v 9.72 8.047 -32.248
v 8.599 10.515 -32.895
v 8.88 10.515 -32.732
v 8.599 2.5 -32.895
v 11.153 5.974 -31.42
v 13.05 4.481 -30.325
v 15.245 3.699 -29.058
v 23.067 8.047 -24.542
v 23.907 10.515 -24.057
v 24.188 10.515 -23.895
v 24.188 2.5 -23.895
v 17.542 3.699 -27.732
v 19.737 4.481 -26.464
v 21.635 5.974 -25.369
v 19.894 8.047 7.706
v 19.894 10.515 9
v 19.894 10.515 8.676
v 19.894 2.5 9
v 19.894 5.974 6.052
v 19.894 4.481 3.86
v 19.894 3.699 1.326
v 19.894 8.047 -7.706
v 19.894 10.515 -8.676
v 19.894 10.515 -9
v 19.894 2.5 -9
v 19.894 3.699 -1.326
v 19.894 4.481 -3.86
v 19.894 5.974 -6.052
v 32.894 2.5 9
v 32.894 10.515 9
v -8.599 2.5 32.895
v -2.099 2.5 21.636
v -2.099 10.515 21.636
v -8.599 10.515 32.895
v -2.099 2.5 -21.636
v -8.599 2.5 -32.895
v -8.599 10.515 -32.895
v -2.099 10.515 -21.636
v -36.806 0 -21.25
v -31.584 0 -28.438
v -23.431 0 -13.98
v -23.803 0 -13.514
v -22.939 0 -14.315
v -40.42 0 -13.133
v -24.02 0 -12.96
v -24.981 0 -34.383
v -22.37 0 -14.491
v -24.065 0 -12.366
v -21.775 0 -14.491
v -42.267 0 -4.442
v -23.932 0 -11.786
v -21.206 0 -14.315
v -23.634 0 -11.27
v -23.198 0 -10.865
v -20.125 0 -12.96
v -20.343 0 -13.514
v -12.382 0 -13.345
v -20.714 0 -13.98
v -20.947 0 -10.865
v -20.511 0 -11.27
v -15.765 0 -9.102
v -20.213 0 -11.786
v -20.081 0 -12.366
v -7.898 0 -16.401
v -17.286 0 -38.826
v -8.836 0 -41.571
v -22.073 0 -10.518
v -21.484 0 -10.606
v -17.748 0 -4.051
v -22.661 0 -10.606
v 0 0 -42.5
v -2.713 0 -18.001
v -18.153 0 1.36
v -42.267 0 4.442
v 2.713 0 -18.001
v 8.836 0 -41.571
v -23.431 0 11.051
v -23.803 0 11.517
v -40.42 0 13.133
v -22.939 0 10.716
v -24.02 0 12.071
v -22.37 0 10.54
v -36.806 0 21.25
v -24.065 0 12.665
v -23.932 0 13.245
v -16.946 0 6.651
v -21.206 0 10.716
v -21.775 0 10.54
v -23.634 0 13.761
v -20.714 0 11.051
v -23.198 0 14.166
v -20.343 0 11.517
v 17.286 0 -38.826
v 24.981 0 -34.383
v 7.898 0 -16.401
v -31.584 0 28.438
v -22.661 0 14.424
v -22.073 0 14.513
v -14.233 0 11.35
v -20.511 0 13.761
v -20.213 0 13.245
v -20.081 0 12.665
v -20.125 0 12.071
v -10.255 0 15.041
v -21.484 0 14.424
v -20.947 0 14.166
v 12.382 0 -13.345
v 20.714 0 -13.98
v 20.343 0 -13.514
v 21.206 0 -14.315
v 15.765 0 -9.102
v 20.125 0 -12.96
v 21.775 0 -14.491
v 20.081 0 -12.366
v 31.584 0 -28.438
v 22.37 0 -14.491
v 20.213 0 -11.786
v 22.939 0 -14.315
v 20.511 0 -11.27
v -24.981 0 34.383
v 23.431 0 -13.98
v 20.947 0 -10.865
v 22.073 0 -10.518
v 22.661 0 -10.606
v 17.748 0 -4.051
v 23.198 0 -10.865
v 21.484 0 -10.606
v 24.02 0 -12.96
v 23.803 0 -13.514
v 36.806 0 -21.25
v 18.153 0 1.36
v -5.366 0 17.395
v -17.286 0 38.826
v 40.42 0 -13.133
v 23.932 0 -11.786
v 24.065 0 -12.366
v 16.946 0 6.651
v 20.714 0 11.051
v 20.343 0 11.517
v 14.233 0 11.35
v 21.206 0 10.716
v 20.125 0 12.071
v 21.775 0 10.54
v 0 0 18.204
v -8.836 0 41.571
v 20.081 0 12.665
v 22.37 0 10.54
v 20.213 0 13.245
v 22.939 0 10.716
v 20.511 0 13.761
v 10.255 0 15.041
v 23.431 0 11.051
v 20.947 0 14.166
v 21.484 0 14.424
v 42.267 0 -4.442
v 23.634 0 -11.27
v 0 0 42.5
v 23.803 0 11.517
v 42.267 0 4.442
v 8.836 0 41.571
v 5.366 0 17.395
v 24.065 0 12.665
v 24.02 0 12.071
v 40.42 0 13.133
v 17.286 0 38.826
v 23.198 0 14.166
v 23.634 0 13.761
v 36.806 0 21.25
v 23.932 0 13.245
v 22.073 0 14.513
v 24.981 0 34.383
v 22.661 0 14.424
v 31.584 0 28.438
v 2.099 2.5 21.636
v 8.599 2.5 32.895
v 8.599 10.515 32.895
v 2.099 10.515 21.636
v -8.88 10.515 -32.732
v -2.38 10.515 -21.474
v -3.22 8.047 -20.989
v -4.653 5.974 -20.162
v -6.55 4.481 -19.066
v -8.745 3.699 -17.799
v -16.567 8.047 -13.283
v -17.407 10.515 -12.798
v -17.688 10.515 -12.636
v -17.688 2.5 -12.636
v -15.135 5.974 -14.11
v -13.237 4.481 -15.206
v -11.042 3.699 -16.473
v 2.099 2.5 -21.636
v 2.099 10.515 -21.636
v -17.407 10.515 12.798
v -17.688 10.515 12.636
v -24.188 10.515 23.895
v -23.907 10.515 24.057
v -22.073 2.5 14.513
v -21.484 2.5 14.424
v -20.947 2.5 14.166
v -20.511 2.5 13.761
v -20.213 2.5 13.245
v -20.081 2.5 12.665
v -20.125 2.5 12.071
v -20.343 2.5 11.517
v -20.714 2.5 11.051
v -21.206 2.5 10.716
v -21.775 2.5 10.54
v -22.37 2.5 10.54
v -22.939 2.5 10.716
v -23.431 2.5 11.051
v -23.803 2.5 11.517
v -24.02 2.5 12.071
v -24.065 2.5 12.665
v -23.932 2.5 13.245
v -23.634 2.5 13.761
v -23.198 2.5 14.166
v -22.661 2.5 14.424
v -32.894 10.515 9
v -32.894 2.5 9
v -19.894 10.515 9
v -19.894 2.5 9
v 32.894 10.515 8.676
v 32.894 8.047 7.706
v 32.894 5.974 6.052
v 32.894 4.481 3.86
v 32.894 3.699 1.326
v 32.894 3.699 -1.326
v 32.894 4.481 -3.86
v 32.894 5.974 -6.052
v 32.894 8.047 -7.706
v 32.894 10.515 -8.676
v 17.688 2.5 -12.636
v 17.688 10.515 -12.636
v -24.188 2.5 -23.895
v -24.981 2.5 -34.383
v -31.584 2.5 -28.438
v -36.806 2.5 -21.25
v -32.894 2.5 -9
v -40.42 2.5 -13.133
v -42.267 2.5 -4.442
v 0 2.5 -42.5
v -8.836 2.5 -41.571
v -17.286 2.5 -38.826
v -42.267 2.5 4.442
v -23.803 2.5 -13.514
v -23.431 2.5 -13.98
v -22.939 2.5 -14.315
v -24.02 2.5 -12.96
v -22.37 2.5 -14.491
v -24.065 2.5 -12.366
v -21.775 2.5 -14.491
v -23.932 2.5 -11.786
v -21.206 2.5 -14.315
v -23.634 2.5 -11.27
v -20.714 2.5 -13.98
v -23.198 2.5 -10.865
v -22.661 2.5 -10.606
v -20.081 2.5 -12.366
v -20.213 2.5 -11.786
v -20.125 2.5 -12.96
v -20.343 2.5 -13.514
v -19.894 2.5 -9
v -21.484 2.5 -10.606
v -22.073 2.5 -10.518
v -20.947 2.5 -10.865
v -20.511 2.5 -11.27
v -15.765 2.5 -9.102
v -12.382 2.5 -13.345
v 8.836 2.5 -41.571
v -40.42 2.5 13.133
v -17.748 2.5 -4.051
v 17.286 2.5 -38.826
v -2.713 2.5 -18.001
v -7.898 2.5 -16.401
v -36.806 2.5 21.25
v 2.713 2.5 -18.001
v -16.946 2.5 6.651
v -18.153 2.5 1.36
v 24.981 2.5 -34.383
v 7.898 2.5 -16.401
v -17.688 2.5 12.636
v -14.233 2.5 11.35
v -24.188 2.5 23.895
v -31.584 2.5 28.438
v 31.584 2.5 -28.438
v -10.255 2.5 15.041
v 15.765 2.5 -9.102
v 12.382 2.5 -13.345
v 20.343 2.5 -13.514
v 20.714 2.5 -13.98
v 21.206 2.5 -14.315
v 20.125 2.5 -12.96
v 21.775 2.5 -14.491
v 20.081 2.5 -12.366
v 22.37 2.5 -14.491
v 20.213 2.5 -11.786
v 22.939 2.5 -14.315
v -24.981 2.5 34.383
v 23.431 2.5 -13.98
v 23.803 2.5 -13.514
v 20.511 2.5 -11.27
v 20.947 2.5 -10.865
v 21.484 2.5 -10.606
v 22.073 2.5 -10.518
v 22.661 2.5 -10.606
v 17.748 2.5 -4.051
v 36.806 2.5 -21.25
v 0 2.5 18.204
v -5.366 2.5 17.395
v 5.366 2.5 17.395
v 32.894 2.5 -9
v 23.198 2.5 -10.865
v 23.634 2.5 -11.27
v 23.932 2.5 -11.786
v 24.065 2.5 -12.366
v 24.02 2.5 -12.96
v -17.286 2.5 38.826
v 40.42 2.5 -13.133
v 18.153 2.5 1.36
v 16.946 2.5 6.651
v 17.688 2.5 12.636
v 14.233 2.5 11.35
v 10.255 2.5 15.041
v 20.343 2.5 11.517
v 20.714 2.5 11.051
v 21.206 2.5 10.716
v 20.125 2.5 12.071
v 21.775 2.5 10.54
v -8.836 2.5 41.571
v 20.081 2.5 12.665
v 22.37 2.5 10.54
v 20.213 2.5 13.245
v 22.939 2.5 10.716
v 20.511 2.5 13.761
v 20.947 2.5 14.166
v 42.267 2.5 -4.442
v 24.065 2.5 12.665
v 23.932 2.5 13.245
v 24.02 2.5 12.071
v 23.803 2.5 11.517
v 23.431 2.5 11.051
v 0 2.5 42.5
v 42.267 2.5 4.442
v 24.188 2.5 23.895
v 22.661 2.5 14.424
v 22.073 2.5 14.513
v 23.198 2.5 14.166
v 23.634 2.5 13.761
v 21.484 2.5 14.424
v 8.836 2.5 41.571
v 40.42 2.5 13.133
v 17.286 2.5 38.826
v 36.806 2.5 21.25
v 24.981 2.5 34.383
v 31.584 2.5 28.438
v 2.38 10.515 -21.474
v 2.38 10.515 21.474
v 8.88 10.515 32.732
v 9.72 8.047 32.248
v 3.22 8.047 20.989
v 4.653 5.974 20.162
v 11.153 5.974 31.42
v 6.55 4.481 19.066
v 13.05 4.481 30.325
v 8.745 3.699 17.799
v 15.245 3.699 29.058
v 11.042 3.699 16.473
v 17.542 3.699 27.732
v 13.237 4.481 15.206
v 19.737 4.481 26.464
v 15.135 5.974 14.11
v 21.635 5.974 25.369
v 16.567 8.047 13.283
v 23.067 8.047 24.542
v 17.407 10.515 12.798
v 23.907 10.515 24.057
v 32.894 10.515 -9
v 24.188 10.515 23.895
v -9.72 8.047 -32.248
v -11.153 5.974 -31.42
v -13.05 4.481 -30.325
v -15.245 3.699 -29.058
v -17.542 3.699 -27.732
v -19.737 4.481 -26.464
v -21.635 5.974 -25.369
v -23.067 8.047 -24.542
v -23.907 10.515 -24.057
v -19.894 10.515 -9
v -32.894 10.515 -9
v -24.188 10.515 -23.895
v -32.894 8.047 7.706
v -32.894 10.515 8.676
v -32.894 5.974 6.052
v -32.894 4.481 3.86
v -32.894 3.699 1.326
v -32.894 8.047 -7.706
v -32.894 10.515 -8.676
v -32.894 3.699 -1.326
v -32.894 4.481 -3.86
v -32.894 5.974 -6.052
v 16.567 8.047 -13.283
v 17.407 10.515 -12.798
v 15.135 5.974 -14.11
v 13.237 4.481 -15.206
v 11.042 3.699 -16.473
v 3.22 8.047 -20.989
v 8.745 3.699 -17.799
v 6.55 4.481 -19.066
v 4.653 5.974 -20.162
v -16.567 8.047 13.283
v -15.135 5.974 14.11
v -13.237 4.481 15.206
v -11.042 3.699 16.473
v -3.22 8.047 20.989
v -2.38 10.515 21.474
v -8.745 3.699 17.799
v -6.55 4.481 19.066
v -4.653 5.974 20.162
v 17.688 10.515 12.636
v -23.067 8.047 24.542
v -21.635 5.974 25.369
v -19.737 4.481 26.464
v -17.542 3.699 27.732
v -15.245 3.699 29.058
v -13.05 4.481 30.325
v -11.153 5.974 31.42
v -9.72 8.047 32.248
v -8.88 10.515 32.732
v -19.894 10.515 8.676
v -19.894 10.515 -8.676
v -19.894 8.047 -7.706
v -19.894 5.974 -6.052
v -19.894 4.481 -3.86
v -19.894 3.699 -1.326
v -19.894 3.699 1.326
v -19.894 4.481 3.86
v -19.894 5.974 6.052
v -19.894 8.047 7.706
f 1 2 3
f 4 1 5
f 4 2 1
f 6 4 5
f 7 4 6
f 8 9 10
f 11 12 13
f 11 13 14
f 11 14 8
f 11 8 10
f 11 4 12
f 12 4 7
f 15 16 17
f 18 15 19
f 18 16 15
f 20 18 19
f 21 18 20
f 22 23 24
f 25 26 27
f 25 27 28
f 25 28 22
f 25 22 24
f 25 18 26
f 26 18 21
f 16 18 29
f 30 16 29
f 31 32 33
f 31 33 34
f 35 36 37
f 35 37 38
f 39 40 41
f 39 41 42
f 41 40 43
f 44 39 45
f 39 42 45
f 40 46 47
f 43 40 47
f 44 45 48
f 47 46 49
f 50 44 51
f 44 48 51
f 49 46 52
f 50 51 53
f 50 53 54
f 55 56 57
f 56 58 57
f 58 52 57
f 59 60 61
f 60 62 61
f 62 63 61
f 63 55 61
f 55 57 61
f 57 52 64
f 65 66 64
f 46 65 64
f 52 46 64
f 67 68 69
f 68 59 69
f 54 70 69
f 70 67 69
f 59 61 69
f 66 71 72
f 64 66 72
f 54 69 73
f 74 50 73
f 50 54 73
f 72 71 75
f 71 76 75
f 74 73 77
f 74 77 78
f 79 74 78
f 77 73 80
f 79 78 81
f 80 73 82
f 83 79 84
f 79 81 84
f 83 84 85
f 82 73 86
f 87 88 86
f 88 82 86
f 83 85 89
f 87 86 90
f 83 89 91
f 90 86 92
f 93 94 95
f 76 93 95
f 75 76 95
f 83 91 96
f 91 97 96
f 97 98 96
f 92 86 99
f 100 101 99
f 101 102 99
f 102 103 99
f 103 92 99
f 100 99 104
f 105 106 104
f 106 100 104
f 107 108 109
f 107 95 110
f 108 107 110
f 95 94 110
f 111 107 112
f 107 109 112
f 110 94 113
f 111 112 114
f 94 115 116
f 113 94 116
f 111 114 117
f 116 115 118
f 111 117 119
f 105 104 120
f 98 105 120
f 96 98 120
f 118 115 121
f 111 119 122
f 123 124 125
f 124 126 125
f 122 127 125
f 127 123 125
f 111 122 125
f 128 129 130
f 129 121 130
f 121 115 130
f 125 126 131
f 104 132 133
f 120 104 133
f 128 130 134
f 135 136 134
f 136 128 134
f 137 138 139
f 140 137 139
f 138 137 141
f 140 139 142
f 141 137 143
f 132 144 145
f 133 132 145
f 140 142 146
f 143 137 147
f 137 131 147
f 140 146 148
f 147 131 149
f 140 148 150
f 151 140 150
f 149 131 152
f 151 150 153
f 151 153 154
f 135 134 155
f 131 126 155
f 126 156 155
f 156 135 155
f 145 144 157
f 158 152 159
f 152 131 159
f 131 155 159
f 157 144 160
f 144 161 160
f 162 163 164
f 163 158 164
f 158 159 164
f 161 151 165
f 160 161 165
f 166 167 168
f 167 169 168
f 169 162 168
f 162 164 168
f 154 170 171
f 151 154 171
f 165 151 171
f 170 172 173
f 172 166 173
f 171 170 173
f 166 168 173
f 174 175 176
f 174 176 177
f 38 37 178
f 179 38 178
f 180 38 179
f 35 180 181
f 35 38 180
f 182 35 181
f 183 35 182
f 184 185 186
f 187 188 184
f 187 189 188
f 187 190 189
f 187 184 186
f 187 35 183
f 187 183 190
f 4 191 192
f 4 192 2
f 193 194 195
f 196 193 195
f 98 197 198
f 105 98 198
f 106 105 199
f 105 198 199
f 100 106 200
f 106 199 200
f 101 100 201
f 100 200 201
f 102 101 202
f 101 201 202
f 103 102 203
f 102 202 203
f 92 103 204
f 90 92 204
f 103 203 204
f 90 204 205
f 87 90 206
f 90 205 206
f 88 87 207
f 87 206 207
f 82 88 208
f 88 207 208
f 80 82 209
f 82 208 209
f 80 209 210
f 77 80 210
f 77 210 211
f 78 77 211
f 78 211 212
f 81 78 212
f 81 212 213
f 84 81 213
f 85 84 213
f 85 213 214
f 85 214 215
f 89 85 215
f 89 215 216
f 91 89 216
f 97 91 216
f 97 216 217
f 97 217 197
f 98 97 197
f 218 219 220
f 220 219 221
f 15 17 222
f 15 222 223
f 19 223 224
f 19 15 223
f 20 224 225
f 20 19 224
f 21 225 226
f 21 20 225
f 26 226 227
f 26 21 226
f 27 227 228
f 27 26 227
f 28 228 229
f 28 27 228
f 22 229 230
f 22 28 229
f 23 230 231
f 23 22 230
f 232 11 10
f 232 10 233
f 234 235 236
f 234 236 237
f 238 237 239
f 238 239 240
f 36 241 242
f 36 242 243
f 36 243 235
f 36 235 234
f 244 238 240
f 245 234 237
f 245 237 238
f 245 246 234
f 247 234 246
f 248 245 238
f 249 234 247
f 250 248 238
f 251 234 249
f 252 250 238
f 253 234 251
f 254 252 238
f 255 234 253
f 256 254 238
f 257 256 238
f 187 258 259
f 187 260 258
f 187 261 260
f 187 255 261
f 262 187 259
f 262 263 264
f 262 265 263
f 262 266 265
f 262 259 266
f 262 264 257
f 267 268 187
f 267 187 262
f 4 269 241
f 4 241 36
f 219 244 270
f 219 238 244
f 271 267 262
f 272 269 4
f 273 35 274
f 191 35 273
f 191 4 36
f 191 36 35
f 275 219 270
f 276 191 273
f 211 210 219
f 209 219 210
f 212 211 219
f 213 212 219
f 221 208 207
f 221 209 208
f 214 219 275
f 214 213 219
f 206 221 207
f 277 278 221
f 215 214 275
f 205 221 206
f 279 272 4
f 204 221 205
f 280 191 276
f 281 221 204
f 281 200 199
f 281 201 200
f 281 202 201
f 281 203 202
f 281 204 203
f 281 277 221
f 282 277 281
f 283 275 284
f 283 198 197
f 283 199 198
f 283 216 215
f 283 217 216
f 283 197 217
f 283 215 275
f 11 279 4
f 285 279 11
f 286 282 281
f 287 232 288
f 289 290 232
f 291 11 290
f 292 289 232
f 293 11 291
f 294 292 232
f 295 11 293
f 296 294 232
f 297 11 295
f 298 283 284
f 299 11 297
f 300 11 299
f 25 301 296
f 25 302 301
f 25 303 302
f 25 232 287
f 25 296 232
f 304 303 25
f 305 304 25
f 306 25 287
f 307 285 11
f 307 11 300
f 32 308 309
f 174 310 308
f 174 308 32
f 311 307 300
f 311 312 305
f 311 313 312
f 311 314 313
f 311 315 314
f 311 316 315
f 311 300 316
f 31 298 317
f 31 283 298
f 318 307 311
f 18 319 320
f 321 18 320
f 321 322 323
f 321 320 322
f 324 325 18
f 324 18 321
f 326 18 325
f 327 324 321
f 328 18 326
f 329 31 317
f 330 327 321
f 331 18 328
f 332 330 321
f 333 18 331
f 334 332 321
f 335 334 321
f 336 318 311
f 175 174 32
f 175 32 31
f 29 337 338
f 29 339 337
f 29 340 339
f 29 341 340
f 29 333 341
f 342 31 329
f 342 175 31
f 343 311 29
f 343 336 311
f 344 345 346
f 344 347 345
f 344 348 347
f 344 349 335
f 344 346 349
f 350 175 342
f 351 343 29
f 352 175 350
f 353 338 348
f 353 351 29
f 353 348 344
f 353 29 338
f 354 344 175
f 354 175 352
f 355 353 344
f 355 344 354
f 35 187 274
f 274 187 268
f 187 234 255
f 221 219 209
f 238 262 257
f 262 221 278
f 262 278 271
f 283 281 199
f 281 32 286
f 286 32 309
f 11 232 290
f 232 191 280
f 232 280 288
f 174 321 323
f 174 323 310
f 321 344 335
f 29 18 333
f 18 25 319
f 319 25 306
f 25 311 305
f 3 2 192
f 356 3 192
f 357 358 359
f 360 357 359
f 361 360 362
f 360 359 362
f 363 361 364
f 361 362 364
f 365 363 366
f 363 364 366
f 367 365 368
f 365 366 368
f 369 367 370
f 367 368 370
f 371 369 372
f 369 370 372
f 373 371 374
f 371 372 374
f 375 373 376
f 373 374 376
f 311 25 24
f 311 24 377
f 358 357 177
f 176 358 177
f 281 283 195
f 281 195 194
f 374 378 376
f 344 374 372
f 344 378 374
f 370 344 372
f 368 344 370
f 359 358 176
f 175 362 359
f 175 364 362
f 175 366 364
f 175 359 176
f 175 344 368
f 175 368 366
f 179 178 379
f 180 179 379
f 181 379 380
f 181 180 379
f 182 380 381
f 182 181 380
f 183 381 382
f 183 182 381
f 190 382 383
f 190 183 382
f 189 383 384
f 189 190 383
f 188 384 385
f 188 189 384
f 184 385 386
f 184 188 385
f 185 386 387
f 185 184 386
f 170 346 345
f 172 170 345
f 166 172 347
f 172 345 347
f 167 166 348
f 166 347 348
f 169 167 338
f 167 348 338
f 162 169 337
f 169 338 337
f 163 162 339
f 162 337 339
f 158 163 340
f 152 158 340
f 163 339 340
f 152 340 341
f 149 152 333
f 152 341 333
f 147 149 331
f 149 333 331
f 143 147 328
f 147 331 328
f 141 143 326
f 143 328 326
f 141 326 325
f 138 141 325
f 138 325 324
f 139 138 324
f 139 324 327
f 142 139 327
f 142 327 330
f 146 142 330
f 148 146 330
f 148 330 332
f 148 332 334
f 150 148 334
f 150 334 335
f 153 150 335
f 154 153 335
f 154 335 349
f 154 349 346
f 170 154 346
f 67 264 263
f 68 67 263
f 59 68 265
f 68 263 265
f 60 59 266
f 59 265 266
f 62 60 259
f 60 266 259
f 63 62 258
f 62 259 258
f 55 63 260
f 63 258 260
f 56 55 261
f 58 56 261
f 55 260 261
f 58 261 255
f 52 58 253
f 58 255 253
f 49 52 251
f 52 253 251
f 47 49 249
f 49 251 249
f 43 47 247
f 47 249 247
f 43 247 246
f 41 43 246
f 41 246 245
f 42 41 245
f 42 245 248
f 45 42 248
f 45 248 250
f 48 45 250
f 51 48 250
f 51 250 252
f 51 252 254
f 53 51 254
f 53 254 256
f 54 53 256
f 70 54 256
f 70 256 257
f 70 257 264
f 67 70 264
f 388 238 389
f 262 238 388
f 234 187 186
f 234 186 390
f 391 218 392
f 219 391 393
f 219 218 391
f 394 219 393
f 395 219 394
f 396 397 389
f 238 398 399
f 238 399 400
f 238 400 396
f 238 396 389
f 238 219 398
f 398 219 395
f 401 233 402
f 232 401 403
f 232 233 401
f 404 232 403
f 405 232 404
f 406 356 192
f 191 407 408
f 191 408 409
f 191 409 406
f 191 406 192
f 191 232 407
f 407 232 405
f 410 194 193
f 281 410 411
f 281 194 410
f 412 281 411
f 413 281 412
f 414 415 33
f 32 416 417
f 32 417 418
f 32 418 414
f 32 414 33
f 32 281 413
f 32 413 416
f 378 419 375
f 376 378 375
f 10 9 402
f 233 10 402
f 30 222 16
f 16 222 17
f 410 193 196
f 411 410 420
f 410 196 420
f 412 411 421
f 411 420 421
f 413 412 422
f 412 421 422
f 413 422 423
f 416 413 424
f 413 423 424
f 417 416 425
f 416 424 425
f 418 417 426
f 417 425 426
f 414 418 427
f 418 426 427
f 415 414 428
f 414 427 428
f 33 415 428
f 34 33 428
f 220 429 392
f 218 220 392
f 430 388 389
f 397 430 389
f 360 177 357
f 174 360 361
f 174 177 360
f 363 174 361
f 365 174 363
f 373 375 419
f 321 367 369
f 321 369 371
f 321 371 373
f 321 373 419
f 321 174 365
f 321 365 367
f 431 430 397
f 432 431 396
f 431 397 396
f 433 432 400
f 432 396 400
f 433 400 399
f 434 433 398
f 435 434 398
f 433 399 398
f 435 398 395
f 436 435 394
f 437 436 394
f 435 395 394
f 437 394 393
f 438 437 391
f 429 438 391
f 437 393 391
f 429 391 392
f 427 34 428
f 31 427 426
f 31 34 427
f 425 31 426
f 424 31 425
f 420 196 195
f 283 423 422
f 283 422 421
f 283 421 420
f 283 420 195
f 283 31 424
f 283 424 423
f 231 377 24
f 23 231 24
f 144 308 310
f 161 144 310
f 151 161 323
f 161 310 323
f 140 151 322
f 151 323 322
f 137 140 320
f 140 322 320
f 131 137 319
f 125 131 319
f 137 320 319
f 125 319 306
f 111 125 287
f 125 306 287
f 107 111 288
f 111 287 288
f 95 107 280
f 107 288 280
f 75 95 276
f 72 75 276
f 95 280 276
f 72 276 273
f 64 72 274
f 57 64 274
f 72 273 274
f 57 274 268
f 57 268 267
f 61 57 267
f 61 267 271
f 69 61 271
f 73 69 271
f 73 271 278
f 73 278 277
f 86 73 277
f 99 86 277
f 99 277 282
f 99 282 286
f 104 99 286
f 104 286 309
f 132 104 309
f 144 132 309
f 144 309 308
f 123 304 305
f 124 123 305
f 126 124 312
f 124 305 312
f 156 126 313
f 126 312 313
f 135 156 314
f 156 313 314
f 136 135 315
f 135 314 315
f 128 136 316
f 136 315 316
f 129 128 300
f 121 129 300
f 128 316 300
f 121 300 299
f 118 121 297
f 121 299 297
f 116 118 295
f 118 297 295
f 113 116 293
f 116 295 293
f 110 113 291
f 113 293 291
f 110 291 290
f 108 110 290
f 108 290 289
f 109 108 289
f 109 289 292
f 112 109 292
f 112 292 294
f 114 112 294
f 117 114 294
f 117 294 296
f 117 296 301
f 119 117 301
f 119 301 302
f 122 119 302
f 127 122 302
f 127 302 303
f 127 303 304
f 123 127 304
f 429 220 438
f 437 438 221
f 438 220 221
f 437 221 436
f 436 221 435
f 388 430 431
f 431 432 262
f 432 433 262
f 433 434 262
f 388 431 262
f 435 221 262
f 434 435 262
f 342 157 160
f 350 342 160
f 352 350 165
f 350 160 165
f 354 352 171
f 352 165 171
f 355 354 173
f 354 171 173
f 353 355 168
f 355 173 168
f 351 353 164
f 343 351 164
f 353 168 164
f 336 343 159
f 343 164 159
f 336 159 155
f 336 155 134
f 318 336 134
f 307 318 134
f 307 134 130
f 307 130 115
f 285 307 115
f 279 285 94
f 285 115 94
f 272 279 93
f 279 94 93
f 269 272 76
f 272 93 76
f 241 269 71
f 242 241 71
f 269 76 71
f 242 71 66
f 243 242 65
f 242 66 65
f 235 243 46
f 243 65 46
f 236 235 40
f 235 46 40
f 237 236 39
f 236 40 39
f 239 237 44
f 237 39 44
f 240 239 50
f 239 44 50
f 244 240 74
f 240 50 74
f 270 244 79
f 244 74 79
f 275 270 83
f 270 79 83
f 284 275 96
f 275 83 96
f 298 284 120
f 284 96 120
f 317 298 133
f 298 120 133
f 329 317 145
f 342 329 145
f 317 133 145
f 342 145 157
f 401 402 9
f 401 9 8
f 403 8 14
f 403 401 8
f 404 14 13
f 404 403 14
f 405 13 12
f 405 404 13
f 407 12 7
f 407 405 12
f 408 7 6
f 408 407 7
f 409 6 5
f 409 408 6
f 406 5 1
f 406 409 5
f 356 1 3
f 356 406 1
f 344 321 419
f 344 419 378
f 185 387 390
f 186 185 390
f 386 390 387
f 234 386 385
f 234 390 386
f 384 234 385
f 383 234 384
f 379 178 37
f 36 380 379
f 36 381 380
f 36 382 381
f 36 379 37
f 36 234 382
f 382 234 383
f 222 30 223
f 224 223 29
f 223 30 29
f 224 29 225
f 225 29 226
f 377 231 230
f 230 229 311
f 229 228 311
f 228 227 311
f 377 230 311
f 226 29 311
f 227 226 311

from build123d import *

# Parameters (mm, degrees)
SKETCH1_R           = 42.5
BOSS_EXTRUDE1_DEPTH = 2.5
SKETCH3_W           = 13
SKETCH3_H           = 18
BOSS_EXTRUDE2_DEPTH = 20
SKETCH4_R           = 8.9
CUT_EXTRUDE2_DEPTH  = 20
SKETCH5_R           = 8.9
CUT_EXTRUDE3_DEPTH  = 20
SKETCH6_R           = 8.9
CUT_EXTRUDE4_DEPTH  = 20
CUT_EXTRUDE5_START  = -20
SKETCH7_R           = 8.9
CUT_EXTRUDE5_DEPTH  = 20
CUT_EXTRUDE6_START  = -20
SKETCH8_R           = 8.9
CUT_EXTRUDE6_DEPTH  = 20
CUT_EXTRUDE7_START  = -20
SKETCH9_R           = 8.9
CUT_EXTRUDE7_DEPTH  = 20
CUT_EXTRUDE8_DEPTH  = 76.388
SKETCH11_W          = 71.811217628
SKETCH11_H          = 11.984599711
CUT_EXTRUDE9_DEPTH  = 76.388
SKETCH12_R          = 18.204170311
CUT_EXTRUDE10_DEPTH = 76.388
SKETCH13_R          = 1.997627935
CUT_EXTRUDE11_DEPTH = 10


with BuildPart() as part:
    # Sketch1 → Boss-Extrude1 (new body)
    with BuildSketch(Plane(origin=(0, 0, 0), x_dir=(1, 0, 0), z_dir=(0, 1, 0))):
        Circle(SKETCH1_R)
    extrude(amount=BOSS_EXTRUDE1_DEPTH)

    # Sketch3 → Boss-Extrude2 (add)
    with BuildSketch(Plane(origin=(0, 2.5, 0), x_dir=(1, 0, 0), z_dir=(0, 1, 0))):
        with Locations((-26.394376419, 0)):
            Rectangle(SKETCH3_W, SKETCH3_H)
        with Locations((26.394376419, 0)):
            Rectangle(SKETCH3_W, SKETCH3_H)
        Polygon((-8.599367677, 32.894541729), (-2.099367677, 21.63621148), (-17.687824945, 12.63621148), (-24.187824945, 23.894541729), align=None)
        Polygon((8.599367677, 32.894541729), (24.187824945, 23.894541729), (17.687824945, 12.63621148), (2.099367677, 21.63621148), align=None)
        Polygon((8.599367677, -32.894541729), (2.099367677, -21.63621148), (17.687824945, -12.63621148), (24.187824945, -23.894541729), align=None)
        Polygon((-8.599367677, -32.894541729), (-24.187824945, -23.894541729), (-17.687824945, -12.63621148), (-2.099367677, -21.63621148), align=None)
    extrude(amount=BOSS_EXTRUDE2_DEPTH)

    # Sketch4 → Cut-Extrude2 (cut)
    with BuildSketch(Plane.ZY.offset(32.894376419)):
        with Locations((0, 12.5)):
            Circle(SKETCH4_R)
    extrude(amount=-CUT_EXTRUDE2_DEPTH, mode=Mode.SUBTRACT)

    # Sketch5 → Cut-Extrude3 (cut)
    with BuildSketch(Plane(origin=(-16.393596311, 0, 28.394541729), x_dir=(0.8660254037844386, 0, 0.5000000000000003), z_dir=(-0.5000000000000003, 0, 0.8660254037844386))):
        with Locations((0, 12.5)):
            Circle(SKETCH5_R)
    extrude(amount=-CUT_EXTRUDE3_DEPTH, mode=Mode.SUBTRACT)

    # Sketch6 → Cut-Extrude4 (cut)
    with BuildSketch(Plane(origin=(16.393596311, 0, 28.394541729), x_dir=(0.8660254037844386, 0, -0.5000000000000003), z_dir=(0.5000000000000003, 0, 0.8660254037844386))):
        with Locations((0, 12.5)):
            Circle(SKETCH6_R)
    extrude(amount=-CUT_EXTRUDE4_DEPTH, mode=Mode.SUBTRACT)

    # Sketch7 → Cut-Extrude5 (cut)
    with BuildSketch(Plane(origin=(32.894376419, 0, 0), x_dir=(0, 0, -1), z_dir=(1, 0, 0)).offset(CUT_EXTRUDE5_START)):
        with Locations((0, 12.5)):
            Circle(SKETCH7_R)
    extrude(amount=CUT_EXTRUDE5_DEPTH, mode=Mode.SUBTRACT)

    # Sketch8 → Cut-Extrude6 (cut)
    with BuildSketch(Plane(origin=(16.393596311, 0, -28.394541729), x_dir=(-0.8660254037844386, 0, -0.5000000000000003), z_dir=(0.5000000000000003, 0, -0.8660254037844386)).offset(CUT_EXTRUDE6_START)):
        with Locations((0, 12.5)):
            Circle(SKETCH8_R)
    extrude(amount=CUT_EXTRUDE6_DEPTH, mode=Mode.SUBTRACT)

    # Sketch9 → Cut-Extrude7 (cut)
    with BuildSketch(Plane(origin=(-16.393596311, 0, -28.394541729), x_dir=(-0.8660254037844386, 0, 0.5000000000000003), z_dir=(-0.5000000000000003, 0, -0.8660254037844386)).offset(CUT_EXTRUDE7_START)):
        with Locations((0, 12.5)):
            Circle(SKETCH9_R)
    extrude(amount=CUT_EXTRUDE7_DEPTH, mode=Mode.SUBTRACT)

    # Sketch10 → Cut-Extrude8 (cut)
    with BuildSketch(Plane(origin=(-16.393596311, 0, -28.394541729), x_dir=(-0.8660254037844386, 0, 0.5000000000000003), z_dir=(-0.5000000000000003, 0, -0.8660254037844386))):
        Polygon((-35.669118209, 18.214643823), (-9, 18.214643823), (-9, 22.5), (9, 22.5), (9, 18.214643823), (33.747549551, 18.214643823), (33.747549551, 25.559573076), (-35.669118209, 25.559573076), align=None)
    extrude(amount=-CUT_EXTRUDE8_DEPTH, mode=Mode.SUBTRACT)

    # Sketch11 → Cut-Extrude9 (cut)
    with BuildSketch(Plane(origin=(-16.393596311, 0, -28.394541729), x_dir=(-0.8660254037844386, 0, 0.5000000000000003), z_dir=(-0.5000000000000003, 0, -0.8660254037844386))):
        with Locations((1.515702587, 16.507700144)):
            Rectangle(SKETCH11_W, SKETCH11_H)
    extrude(amount=-CUT_EXTRUDE9_DEPTH, mode=Mode.SUBTRACT)

    # Sketch12 → Cut-Extrude10 (cut)
    with BuildSketch(Plane(origin=(0, 2.5, 0), x_dir=(1, 0, 0), z_dir=(0, 1, 0))):
        Circle(SKETCH12_R)
    extrude(amount=-CUT_EXTRUDE10_DEPTH, mode=Mode.SUBTRACT)

    # Sketch13 → Cut-Extrude11 (cut)
    with BuildSketch(Plane(origin=(0, 2.5, 0), x_dir=(1, 0, 0), z_dir=(0, 1, 0))):
        with Locations((-22.072556502, 12.515367089)):
            Circle(SKETCH13_R)
        with Locations((22.072556502, 12.515367089)):
            Circle(SKETCH13_R)
        with Locations((22.072556502, -12.515367089)):
            Circle(SKETCH13_R)
        with Locations((-22.072556502, -12.515367089)):
            Circle(SKETCH13_R)
    extrude(amount=-CUT_EXTRUDE11_DEPTH, mode=Mode.SUBTRACT)


solid = part.part
